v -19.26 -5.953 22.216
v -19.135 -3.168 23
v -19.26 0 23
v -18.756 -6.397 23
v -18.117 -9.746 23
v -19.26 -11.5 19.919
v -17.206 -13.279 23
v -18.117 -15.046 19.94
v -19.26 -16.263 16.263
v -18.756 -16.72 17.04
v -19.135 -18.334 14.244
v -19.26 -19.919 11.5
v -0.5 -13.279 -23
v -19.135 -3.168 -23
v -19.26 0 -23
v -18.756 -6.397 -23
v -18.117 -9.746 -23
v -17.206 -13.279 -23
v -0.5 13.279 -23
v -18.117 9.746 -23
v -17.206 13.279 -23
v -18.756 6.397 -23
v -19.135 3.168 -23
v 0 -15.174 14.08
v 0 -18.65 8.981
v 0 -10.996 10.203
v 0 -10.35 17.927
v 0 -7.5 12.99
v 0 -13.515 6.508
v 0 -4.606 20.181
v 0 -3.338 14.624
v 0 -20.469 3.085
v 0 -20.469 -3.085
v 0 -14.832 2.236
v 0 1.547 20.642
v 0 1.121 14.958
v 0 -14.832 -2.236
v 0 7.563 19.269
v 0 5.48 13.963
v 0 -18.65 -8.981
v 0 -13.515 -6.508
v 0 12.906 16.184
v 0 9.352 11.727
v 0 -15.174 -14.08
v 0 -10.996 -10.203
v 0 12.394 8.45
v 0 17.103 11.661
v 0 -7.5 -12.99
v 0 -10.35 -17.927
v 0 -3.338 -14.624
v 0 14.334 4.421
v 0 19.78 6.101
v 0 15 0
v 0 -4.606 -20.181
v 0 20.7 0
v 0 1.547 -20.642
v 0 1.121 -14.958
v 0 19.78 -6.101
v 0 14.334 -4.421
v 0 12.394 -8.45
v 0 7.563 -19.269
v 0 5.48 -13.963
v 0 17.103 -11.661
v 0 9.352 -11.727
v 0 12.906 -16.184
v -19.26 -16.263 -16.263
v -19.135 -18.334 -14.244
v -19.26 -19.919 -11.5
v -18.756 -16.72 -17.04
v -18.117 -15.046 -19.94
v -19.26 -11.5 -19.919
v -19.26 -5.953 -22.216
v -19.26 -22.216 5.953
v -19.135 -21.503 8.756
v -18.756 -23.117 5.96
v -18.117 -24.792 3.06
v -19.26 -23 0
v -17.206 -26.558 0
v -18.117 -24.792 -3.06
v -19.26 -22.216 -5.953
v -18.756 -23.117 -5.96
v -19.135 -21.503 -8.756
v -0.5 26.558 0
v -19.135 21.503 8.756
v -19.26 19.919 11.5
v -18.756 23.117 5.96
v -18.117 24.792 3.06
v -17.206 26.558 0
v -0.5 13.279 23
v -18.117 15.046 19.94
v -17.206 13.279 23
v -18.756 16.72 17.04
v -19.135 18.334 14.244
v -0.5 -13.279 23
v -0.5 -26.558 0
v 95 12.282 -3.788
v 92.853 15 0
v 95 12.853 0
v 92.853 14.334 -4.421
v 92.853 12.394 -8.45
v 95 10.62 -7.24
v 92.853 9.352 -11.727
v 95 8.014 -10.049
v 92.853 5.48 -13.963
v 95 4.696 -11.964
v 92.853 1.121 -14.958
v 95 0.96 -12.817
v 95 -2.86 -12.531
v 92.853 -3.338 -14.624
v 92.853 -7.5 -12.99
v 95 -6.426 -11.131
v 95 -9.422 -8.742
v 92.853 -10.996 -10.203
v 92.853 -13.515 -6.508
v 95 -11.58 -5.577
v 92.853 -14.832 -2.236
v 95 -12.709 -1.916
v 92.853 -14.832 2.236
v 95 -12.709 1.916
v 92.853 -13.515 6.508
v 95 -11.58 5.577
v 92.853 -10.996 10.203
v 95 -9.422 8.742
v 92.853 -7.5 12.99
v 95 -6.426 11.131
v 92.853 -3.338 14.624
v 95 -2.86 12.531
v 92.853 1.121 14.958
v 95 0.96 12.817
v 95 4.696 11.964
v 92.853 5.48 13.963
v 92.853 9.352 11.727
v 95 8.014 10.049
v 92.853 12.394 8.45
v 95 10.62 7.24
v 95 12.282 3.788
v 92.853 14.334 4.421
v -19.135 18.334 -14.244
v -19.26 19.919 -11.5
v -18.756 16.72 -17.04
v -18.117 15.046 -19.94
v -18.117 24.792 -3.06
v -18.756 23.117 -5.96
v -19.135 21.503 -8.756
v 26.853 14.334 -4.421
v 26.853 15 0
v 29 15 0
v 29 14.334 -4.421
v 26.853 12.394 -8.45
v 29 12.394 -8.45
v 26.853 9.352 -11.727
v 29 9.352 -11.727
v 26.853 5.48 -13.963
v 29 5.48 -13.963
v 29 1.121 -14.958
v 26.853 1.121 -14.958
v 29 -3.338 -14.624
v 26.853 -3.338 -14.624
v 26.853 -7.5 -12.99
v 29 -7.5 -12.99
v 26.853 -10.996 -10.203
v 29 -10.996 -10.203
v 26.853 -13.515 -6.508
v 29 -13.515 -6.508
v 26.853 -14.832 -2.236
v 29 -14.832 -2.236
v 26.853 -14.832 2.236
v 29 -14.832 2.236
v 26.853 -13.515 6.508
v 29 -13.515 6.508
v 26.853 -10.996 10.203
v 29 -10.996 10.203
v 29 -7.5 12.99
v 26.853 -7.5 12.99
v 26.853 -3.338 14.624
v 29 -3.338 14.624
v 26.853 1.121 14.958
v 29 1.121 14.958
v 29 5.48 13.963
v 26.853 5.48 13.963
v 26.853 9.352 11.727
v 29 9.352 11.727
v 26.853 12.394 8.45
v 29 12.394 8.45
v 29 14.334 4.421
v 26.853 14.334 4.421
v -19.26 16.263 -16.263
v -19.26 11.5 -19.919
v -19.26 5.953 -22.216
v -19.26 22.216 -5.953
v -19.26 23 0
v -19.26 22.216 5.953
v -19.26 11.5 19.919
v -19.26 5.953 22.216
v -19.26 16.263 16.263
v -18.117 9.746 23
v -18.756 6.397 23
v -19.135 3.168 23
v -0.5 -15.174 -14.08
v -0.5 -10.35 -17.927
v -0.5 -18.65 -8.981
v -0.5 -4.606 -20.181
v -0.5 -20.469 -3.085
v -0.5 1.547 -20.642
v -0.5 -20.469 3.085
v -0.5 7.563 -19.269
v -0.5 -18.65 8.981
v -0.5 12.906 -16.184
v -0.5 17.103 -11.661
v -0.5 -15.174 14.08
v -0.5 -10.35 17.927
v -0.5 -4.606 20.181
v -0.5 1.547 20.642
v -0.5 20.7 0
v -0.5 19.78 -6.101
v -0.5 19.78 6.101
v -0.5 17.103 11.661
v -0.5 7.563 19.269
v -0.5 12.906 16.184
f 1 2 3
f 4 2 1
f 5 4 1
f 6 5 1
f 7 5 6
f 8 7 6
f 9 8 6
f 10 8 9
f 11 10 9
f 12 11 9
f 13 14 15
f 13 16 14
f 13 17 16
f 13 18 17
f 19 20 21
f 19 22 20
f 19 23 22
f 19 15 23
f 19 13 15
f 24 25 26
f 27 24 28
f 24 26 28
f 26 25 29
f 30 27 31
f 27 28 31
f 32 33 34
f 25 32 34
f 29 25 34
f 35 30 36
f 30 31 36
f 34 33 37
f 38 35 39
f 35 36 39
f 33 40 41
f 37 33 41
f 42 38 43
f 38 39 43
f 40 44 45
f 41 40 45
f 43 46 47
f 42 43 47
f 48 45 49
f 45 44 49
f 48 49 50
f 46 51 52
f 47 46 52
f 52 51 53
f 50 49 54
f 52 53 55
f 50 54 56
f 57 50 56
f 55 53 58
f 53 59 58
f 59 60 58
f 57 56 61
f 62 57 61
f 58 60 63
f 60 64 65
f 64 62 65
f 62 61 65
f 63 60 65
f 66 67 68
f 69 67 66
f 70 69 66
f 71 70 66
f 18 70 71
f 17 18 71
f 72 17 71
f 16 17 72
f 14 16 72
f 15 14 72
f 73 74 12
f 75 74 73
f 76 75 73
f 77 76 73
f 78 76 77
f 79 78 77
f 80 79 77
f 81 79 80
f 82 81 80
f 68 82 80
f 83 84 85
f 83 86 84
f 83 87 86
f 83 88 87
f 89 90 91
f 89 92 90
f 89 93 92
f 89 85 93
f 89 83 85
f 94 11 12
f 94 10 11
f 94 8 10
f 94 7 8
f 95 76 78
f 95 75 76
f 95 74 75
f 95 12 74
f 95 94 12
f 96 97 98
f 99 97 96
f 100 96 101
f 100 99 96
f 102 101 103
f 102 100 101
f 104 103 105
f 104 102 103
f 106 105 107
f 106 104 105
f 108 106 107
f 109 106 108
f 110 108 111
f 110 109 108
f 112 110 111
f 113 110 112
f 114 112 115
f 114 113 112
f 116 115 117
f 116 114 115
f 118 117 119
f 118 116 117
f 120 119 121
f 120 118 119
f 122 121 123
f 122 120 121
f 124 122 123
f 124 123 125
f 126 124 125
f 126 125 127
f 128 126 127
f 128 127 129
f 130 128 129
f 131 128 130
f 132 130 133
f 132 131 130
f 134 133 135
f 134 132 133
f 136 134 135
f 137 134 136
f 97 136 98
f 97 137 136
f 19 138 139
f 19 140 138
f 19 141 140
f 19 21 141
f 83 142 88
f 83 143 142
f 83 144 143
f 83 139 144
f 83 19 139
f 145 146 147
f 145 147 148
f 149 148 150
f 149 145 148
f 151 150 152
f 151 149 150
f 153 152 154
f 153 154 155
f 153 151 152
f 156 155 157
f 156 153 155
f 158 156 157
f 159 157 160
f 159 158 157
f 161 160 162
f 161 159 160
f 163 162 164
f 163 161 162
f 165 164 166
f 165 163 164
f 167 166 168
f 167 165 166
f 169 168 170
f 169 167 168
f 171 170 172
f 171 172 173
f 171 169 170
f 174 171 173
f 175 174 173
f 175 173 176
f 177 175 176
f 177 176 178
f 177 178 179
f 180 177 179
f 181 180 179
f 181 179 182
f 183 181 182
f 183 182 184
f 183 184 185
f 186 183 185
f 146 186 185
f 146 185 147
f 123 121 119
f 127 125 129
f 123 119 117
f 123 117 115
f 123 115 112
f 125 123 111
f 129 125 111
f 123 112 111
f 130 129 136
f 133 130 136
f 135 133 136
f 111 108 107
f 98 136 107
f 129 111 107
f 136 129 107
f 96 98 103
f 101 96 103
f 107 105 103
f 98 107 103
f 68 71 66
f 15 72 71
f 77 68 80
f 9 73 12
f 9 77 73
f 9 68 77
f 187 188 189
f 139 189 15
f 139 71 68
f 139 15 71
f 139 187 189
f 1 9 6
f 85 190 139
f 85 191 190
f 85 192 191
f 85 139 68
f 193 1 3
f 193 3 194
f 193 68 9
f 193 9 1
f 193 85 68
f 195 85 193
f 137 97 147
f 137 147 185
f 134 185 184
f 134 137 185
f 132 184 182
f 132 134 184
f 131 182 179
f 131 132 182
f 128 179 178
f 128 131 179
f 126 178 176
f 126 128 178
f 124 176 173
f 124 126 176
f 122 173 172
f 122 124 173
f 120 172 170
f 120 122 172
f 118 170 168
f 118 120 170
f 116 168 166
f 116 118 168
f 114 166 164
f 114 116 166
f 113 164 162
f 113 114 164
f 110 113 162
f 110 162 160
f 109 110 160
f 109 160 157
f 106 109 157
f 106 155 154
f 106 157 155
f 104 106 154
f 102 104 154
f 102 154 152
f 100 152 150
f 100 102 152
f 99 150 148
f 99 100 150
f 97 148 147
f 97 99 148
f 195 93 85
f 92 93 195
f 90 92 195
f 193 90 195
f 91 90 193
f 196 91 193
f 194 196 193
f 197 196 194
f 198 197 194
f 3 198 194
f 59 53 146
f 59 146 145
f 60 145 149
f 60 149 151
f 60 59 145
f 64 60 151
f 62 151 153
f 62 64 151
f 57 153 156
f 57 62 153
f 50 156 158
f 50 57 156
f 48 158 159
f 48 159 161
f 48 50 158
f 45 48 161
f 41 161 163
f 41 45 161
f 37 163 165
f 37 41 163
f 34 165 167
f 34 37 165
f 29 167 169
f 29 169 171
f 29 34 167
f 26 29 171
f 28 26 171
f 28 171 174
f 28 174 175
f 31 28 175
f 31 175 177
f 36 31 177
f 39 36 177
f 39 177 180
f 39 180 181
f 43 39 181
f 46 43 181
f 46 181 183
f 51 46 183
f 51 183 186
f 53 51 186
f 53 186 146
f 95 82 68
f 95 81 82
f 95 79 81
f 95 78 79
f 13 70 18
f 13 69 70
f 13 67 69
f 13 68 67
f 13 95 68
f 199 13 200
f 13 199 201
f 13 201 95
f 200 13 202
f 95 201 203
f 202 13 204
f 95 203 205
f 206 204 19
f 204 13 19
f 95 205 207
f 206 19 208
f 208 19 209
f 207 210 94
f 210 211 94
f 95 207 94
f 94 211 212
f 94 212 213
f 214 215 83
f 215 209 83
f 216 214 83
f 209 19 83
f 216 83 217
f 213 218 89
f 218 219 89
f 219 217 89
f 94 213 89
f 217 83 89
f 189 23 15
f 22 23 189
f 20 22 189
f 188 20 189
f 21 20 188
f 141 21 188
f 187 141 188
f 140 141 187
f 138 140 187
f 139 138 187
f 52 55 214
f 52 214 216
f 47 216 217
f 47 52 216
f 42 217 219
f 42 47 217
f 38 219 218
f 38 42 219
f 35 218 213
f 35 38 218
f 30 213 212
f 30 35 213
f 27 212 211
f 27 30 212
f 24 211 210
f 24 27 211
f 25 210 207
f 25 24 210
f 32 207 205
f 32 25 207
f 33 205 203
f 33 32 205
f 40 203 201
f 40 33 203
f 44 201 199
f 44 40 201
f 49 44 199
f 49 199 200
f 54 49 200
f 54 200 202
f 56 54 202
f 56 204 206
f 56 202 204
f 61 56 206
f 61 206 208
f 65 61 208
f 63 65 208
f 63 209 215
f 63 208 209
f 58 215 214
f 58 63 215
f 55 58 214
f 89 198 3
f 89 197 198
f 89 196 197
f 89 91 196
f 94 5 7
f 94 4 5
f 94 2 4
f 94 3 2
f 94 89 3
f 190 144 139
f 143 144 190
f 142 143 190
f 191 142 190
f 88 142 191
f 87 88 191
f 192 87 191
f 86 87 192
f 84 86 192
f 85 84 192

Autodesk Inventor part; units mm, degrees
ref_plane "YZ Plane" through (0, 0, 0) normal (1, 0, 0) x (0, 1, 0)
ref_plane "XZ Plane" through (0, 0, 0) normal (0, 1, 0) x (-1, 0, 0)
ref_plane "XY Plane" through (0, 0, 0) normal (0, 0, 1) x (1, 0, 0)
sketch "Sketch1" plane through (0, 0, 0) normal (0, 0, 1) x (1, 0, 0)
  line L0 (0, 20.7) -> (0, 15)
  line L1 (29, 15) -> (95, 15)
  line L2 (95, 15) -> (95, 0)
  line L3 (95, 0) -> (-0.5001, 0)
  line L4 (-10.0501, 0) -> (123.65, 0) projected
  line L5 (-0.5001, 0) -> (-0.5001, 20.7)
  line L6 (-0.5001, 20.7) -> (0, 20.7)
  line L7 (29, 15) -> (26.8528, 15)
  line L8 (26.8528, 15) -> (0, 15)
  line L9 (0, -2.07) -> (0, 26.91) projected
  dimension "d0" = 95
  dimension "d1" = 66
  dimension "d2" = 30
  dimension "d9" = 0.5001
  dimension "d10" = 41.4
  dimension "d13" = 2.1472
  dimension "d14" = 30
revolve "Body" add sketch "Sketch1" angle 360 about axis through (95, 0, 0) along (-1, 0, 0)
sketch "Sketch2" plane through (-0.5001, 0, 0) normal (-1, 0, 0) x (0, 0, 1)
  line L0 (0, 26.5581) -> (23, 13.2791)
  line L1 (23, 13.2791) -> (23, -13.2791)
  line L2 (23, -13.2791) -> (0, -26.5581)
  line L3 (0, -26.5581) -> (-23, -13.2791)
  line L4 (-23, -13.2791) -> (-23, 13.2791)
  line L5 (-23, 13.2791) -> (0, 26.5581)
  point P0 (0, 0)
  point P1 (0, 0)
  dimension "d11" = 46
extrude "Head" add sketch "Sketch2" along normal blind 18.76
sketch "Sketch4" plane through (0, 0, 0) normal (0, 0, 1) x (1, 0, 0)
  line L0 (-19.2601, 23) -> (-19.2601, 26.5581)
  line L1 (-19.2601, 26.5581) -> (-17.2058, 26.5581)
  line L2 (-17.2058, 26.5581) -> (-19.2601, 23)
  line L3 (-21.1361, 0) -> (5.1279, 0) projected
  line L4 (-0.5001, 26.5581) -> (-19.2601, 26.5581) projected
  line L5 (-19.2601, 13.2791) -> (-19.2601, 26.5581) projected
  dimension "d5" = 30
  dimension "d19" = 46
revolve "Chamfer1" cut sketch "Sketch4" angle 360 about axis through (-10, 0, 0) along (1, 0, 0)
thread "Thread" size "M30x3.5" class "6g" standard "ISO Metric profile" length 66
chamfer "Chamfer2" distance 2.1471 distance2 2.1472 1 edges at (95, -15, 0) measured on face at (95, -3.9999, 1.1966)
equation "\"d0\" = NLG"
equation "\"d1\" = GEL"
equation "\"d2\" = GD"
equation "\"d10\" = SD2"
equation "\"d14\" = BDM"
equation "\"d11\" = SW"
equation "\"d3\" = KOH - SD"
equation "\"d5\" = ANG1"
equation "\"d19\" = SW0"
equation "\"d15\" = GEL"
equation "\"d6\" = -0.5 * SPD + 0.5 * GD"
equation "\"NLG\" = 95"
equation "\"GD\" = NND"
equation "\"BDM\" = NND"
equation "\"KOH\" = 19.26"
equation "\"GEL\" = 66"
equation "\"SW\" = 46"
equation "\"SW0\" = 46"
equation "\"SPD\" = NND - 1.2269 * TPU"
equation "\"SD2\" = 0.9 * SW"
equation "\"SD\" = 0.5"
equation "\"ANG1\" = 30deg"
equation "\"GAL\" = 0.61345 * TPU"
equation "\"GUL\" = 0.61345 * TPU"
equation "\"RR\" = 1.7"
equation "\"d20\" = -NLG"
equation "\"TOA\" = 30deg"
equation "\"PTC\" = TPU"
equation "\"GD1\" = THREADDIA - 1.2269 * TPU"
equation "\"TPU\" = 3.5"
equation "\"E0\" = 1.155 * SW"
equation "\"SDH\" = 44.98"
equation "\"NND\" = 30"
equation "\"THREADDIA\" = 30"
properties part number "BS 3692 - M30 x 90"
